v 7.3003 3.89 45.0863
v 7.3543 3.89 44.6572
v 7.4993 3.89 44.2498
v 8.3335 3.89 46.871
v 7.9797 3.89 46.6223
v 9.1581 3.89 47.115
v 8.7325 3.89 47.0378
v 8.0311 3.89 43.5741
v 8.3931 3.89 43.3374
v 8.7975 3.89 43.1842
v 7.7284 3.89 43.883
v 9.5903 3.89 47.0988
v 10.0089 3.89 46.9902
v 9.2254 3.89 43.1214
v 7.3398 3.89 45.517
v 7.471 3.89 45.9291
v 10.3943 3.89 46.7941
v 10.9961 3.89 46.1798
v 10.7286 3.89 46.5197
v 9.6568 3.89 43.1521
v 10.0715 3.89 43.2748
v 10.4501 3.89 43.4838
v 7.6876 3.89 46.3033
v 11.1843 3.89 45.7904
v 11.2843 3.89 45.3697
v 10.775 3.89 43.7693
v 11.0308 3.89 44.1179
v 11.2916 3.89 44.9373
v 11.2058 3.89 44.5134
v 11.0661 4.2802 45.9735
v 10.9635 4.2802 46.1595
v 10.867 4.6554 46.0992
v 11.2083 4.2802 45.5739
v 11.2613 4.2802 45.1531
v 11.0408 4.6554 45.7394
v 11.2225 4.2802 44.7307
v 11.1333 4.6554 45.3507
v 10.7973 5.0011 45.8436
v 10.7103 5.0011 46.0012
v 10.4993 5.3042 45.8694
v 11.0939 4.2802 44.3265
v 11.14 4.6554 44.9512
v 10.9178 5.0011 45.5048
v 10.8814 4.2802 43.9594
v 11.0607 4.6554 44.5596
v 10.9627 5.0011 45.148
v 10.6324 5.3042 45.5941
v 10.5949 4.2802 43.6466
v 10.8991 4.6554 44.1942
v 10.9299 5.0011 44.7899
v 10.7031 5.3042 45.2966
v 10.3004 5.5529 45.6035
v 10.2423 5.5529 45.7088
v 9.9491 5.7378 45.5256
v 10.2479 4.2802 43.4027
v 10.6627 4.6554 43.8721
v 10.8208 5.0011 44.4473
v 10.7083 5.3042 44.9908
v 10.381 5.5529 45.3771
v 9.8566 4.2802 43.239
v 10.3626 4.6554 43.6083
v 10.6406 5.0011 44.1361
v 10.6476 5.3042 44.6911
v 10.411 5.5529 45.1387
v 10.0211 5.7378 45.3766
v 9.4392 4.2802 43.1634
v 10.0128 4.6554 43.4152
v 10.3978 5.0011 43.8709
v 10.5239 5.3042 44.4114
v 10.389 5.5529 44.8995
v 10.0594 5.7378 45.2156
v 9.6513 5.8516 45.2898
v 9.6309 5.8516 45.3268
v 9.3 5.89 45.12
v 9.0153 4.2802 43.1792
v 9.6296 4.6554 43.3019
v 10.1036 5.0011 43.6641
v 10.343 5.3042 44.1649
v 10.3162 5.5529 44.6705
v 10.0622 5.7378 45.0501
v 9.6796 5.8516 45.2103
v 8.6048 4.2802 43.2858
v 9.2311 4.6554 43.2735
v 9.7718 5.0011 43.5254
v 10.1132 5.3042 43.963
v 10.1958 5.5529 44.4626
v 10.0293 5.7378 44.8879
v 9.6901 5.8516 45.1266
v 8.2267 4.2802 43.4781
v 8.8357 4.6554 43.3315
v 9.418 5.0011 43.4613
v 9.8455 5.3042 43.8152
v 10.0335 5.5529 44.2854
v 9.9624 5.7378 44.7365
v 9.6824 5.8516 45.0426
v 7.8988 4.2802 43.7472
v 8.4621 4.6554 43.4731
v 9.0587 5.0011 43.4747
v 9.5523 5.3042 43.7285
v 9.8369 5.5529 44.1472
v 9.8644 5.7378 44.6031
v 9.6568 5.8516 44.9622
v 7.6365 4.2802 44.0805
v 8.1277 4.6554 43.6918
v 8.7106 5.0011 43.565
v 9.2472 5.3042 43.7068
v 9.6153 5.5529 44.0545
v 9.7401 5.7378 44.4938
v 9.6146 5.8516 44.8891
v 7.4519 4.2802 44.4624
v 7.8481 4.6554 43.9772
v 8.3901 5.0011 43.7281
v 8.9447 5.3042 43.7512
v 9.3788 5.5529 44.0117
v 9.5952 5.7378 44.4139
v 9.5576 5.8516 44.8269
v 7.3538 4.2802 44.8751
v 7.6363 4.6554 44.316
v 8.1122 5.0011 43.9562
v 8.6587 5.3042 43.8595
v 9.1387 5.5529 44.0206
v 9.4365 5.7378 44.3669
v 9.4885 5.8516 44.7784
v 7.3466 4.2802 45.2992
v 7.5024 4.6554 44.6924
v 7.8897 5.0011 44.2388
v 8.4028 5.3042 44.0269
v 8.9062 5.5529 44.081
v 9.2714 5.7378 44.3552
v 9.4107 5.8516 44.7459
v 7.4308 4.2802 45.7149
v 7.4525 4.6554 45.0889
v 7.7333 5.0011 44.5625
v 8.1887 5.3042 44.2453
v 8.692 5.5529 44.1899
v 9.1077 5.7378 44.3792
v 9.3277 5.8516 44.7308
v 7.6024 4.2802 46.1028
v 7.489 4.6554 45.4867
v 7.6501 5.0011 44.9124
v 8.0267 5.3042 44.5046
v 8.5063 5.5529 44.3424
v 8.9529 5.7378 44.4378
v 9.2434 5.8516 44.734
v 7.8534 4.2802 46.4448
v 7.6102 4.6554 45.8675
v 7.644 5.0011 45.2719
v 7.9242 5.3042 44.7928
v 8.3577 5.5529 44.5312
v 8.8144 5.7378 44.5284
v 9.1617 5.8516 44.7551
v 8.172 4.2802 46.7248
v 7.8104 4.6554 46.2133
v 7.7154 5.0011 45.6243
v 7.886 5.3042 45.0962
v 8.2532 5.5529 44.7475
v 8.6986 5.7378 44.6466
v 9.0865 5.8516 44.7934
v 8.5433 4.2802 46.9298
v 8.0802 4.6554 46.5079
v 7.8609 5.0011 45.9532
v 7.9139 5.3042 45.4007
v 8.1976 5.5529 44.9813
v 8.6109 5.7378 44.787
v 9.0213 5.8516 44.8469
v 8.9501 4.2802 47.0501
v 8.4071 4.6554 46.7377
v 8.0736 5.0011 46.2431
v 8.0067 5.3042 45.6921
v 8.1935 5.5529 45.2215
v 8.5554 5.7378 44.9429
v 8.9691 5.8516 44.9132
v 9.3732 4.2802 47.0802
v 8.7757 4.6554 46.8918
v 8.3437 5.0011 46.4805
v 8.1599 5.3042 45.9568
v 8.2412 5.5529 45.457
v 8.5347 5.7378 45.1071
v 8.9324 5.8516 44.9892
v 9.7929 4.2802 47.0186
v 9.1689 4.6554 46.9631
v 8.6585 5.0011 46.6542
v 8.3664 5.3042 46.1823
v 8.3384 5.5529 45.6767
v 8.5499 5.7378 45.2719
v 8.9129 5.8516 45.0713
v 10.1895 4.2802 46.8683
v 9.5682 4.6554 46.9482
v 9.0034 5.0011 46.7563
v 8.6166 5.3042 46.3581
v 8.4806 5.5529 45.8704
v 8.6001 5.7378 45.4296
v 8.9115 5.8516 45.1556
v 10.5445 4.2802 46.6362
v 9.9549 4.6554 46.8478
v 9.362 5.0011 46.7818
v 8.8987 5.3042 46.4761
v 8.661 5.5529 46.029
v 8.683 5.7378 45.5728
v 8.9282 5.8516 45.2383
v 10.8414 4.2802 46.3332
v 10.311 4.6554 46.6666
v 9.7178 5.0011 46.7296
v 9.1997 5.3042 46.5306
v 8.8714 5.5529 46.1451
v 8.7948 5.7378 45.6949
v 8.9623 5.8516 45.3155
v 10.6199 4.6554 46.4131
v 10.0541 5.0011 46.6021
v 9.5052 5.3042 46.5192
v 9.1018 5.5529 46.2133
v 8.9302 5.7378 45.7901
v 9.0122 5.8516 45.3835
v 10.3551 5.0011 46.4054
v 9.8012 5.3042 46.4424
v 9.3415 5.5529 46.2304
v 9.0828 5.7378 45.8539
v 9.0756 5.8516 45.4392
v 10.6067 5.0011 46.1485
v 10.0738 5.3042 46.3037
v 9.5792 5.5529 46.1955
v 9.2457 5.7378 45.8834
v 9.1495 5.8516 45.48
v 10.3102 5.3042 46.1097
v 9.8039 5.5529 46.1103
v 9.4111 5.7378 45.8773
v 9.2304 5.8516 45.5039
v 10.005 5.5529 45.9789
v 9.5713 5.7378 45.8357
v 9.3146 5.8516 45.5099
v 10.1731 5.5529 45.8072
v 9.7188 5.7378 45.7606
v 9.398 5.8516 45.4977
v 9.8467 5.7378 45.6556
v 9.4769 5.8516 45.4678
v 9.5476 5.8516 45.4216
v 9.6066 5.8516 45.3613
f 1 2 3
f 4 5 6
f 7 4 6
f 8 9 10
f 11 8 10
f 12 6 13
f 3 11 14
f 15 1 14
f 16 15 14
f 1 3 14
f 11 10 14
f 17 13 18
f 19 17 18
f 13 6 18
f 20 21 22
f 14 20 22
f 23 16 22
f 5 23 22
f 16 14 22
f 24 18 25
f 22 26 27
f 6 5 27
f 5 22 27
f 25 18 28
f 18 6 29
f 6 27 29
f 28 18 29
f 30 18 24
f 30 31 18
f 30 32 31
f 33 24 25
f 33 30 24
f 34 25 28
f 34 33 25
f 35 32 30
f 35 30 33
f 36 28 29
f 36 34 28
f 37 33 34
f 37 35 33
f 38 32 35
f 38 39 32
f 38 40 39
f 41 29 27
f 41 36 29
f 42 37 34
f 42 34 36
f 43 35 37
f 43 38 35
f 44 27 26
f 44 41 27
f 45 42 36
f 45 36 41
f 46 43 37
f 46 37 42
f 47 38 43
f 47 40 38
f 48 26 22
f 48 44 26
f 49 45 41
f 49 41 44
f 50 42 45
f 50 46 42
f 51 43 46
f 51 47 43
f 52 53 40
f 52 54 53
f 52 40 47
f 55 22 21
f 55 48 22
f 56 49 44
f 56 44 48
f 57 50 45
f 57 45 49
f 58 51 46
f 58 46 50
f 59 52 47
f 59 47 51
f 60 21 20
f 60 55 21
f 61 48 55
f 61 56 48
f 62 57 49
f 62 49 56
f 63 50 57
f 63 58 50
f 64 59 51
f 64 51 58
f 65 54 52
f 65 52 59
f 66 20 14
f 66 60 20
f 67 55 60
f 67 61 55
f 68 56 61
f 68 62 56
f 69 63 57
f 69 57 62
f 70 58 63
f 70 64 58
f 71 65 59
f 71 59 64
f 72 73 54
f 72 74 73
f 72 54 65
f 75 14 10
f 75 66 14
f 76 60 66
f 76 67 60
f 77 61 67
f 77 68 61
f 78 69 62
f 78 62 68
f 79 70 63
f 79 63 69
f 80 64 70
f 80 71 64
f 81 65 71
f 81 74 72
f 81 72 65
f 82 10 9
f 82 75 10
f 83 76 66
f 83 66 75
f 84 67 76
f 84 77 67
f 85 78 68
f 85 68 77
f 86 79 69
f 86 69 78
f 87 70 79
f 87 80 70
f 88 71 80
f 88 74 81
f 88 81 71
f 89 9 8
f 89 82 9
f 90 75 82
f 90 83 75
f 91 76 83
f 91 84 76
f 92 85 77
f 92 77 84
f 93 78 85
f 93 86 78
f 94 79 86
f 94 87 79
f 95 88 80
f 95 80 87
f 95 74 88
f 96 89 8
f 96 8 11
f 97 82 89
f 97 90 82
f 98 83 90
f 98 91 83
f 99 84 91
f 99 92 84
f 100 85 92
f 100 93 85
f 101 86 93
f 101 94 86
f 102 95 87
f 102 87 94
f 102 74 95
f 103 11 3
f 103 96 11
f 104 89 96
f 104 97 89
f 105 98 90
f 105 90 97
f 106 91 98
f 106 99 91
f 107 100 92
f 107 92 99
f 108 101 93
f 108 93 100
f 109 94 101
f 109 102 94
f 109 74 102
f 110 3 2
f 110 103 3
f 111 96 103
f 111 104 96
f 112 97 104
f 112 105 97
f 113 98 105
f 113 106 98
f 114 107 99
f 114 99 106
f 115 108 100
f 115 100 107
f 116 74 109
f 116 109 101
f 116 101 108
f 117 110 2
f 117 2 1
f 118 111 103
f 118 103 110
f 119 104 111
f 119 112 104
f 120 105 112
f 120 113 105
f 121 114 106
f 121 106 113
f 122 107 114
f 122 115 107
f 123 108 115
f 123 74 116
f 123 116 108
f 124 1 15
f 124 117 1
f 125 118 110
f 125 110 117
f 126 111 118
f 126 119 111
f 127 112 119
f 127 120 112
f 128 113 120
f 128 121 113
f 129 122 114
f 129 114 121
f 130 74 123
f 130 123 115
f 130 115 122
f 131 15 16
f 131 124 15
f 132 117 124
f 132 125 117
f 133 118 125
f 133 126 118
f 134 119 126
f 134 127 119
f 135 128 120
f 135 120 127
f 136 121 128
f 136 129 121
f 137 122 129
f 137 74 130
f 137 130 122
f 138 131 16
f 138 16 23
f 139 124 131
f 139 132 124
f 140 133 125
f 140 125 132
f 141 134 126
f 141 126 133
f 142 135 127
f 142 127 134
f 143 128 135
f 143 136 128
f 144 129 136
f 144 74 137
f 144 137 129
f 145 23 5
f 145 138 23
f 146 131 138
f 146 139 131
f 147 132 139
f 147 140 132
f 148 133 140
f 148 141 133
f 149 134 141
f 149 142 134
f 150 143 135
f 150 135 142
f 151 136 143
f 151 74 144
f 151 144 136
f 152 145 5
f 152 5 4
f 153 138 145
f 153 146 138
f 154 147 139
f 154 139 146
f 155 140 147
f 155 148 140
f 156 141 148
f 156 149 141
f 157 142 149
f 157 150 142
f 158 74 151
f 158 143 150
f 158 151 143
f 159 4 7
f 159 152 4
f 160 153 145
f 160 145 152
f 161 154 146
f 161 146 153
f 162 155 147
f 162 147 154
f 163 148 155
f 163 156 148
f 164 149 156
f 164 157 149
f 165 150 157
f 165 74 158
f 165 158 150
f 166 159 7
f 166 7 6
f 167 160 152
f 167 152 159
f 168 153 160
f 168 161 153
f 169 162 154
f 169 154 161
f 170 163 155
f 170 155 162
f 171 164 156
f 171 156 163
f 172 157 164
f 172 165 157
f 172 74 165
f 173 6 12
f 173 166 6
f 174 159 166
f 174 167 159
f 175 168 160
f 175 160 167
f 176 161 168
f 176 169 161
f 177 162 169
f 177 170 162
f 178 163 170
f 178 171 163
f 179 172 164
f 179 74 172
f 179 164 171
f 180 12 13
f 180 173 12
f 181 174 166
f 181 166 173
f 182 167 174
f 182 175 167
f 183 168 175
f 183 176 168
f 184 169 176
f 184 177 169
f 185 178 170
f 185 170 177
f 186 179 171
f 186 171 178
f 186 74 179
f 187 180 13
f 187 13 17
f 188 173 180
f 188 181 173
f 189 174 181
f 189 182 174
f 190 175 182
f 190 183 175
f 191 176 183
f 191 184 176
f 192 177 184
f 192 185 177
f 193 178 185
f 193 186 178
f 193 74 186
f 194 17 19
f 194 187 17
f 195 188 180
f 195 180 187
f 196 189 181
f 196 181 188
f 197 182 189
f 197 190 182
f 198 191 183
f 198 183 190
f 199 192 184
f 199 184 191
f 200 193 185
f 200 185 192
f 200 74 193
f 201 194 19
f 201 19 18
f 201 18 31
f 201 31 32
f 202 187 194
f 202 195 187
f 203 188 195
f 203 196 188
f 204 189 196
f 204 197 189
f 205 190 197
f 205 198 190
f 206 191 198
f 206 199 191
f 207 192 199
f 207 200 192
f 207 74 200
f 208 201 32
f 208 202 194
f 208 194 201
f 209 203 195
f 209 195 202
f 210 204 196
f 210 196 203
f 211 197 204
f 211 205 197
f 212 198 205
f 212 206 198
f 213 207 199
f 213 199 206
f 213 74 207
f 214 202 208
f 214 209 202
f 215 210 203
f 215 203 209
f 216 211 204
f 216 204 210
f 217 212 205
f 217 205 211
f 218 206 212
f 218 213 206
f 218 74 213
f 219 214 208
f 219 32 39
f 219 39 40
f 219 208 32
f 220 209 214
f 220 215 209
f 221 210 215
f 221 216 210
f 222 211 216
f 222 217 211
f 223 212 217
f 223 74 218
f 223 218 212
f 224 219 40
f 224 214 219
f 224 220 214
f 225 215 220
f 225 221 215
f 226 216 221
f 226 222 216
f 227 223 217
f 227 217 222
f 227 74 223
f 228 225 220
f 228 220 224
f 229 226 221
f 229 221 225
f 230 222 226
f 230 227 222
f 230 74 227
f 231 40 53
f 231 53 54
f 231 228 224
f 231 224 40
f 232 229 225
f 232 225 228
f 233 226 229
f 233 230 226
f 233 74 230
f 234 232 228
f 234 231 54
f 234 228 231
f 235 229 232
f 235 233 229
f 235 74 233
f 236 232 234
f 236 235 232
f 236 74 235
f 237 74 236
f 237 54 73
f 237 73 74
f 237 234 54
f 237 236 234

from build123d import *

# Parameters (mm, degrees)
BOX166_W           = 10
BOX166_H           = 10
BOX166_DEPTH       = 10
CUT082_ROLL_ANGLE  = -90
CUT082_PITCH_ANGLE = -32


with BuildPart() as cube011:
    # Box166 → Box166 (new body)
    with BuildSketch(Plane(origin=(-5, -5, -10), x_dir=(1, 0, 0), z_dir=(0, 0, 1))):
        with Locations((5, 5)):
            Rectangle(BOX166_W, BOX166_H)
    extrude(amount=BOX166_DEPTH)


with BuildPart() as sapphire_half_ball_lens011:
    # Sphere011 → Sphere011 (revolve)
    with BuildSketch(Plane.XZ):
        with BuildLine():
            ThreePointArc((0, -2), (2, 0), (0, 2))
            Line((0, 2), (0, -2))
        make_face()
    revolve(axis=Axis((0, 0, 0), (0, 0, 1)))

    # Cut082: cut Cube011
    add(cube011.part, mode=Mode.SUBTRACT)


with BuildPart() as sapphire_half_ball_lens011_1:
    # Cut082 roll: moved
    add(sapphire_half_ball_lens011.part.rotate(Axis((0, 0, 0), (1, 0, 0)), CUT082_ROLL_ANGLE))


with BuildPart() as sapphire_half_ball_lens011_2:
    # Cut082 pitch: moved
    add(sapphire_half_ball_lens011_1.part.rotate(Axis((0, 0, 0), (0, 1, 0)), CUT082_PITCH_ANGLE))


with BuildPart() as sapphire_half_ball_lens011_3:
    # Cut082 placement: moved
    add(sapphire_half_ball_lens011_2.part.moved(Location((9.3, 3.89, 45.12))))


solid = sapphire_half_ball_lens011_3.part
